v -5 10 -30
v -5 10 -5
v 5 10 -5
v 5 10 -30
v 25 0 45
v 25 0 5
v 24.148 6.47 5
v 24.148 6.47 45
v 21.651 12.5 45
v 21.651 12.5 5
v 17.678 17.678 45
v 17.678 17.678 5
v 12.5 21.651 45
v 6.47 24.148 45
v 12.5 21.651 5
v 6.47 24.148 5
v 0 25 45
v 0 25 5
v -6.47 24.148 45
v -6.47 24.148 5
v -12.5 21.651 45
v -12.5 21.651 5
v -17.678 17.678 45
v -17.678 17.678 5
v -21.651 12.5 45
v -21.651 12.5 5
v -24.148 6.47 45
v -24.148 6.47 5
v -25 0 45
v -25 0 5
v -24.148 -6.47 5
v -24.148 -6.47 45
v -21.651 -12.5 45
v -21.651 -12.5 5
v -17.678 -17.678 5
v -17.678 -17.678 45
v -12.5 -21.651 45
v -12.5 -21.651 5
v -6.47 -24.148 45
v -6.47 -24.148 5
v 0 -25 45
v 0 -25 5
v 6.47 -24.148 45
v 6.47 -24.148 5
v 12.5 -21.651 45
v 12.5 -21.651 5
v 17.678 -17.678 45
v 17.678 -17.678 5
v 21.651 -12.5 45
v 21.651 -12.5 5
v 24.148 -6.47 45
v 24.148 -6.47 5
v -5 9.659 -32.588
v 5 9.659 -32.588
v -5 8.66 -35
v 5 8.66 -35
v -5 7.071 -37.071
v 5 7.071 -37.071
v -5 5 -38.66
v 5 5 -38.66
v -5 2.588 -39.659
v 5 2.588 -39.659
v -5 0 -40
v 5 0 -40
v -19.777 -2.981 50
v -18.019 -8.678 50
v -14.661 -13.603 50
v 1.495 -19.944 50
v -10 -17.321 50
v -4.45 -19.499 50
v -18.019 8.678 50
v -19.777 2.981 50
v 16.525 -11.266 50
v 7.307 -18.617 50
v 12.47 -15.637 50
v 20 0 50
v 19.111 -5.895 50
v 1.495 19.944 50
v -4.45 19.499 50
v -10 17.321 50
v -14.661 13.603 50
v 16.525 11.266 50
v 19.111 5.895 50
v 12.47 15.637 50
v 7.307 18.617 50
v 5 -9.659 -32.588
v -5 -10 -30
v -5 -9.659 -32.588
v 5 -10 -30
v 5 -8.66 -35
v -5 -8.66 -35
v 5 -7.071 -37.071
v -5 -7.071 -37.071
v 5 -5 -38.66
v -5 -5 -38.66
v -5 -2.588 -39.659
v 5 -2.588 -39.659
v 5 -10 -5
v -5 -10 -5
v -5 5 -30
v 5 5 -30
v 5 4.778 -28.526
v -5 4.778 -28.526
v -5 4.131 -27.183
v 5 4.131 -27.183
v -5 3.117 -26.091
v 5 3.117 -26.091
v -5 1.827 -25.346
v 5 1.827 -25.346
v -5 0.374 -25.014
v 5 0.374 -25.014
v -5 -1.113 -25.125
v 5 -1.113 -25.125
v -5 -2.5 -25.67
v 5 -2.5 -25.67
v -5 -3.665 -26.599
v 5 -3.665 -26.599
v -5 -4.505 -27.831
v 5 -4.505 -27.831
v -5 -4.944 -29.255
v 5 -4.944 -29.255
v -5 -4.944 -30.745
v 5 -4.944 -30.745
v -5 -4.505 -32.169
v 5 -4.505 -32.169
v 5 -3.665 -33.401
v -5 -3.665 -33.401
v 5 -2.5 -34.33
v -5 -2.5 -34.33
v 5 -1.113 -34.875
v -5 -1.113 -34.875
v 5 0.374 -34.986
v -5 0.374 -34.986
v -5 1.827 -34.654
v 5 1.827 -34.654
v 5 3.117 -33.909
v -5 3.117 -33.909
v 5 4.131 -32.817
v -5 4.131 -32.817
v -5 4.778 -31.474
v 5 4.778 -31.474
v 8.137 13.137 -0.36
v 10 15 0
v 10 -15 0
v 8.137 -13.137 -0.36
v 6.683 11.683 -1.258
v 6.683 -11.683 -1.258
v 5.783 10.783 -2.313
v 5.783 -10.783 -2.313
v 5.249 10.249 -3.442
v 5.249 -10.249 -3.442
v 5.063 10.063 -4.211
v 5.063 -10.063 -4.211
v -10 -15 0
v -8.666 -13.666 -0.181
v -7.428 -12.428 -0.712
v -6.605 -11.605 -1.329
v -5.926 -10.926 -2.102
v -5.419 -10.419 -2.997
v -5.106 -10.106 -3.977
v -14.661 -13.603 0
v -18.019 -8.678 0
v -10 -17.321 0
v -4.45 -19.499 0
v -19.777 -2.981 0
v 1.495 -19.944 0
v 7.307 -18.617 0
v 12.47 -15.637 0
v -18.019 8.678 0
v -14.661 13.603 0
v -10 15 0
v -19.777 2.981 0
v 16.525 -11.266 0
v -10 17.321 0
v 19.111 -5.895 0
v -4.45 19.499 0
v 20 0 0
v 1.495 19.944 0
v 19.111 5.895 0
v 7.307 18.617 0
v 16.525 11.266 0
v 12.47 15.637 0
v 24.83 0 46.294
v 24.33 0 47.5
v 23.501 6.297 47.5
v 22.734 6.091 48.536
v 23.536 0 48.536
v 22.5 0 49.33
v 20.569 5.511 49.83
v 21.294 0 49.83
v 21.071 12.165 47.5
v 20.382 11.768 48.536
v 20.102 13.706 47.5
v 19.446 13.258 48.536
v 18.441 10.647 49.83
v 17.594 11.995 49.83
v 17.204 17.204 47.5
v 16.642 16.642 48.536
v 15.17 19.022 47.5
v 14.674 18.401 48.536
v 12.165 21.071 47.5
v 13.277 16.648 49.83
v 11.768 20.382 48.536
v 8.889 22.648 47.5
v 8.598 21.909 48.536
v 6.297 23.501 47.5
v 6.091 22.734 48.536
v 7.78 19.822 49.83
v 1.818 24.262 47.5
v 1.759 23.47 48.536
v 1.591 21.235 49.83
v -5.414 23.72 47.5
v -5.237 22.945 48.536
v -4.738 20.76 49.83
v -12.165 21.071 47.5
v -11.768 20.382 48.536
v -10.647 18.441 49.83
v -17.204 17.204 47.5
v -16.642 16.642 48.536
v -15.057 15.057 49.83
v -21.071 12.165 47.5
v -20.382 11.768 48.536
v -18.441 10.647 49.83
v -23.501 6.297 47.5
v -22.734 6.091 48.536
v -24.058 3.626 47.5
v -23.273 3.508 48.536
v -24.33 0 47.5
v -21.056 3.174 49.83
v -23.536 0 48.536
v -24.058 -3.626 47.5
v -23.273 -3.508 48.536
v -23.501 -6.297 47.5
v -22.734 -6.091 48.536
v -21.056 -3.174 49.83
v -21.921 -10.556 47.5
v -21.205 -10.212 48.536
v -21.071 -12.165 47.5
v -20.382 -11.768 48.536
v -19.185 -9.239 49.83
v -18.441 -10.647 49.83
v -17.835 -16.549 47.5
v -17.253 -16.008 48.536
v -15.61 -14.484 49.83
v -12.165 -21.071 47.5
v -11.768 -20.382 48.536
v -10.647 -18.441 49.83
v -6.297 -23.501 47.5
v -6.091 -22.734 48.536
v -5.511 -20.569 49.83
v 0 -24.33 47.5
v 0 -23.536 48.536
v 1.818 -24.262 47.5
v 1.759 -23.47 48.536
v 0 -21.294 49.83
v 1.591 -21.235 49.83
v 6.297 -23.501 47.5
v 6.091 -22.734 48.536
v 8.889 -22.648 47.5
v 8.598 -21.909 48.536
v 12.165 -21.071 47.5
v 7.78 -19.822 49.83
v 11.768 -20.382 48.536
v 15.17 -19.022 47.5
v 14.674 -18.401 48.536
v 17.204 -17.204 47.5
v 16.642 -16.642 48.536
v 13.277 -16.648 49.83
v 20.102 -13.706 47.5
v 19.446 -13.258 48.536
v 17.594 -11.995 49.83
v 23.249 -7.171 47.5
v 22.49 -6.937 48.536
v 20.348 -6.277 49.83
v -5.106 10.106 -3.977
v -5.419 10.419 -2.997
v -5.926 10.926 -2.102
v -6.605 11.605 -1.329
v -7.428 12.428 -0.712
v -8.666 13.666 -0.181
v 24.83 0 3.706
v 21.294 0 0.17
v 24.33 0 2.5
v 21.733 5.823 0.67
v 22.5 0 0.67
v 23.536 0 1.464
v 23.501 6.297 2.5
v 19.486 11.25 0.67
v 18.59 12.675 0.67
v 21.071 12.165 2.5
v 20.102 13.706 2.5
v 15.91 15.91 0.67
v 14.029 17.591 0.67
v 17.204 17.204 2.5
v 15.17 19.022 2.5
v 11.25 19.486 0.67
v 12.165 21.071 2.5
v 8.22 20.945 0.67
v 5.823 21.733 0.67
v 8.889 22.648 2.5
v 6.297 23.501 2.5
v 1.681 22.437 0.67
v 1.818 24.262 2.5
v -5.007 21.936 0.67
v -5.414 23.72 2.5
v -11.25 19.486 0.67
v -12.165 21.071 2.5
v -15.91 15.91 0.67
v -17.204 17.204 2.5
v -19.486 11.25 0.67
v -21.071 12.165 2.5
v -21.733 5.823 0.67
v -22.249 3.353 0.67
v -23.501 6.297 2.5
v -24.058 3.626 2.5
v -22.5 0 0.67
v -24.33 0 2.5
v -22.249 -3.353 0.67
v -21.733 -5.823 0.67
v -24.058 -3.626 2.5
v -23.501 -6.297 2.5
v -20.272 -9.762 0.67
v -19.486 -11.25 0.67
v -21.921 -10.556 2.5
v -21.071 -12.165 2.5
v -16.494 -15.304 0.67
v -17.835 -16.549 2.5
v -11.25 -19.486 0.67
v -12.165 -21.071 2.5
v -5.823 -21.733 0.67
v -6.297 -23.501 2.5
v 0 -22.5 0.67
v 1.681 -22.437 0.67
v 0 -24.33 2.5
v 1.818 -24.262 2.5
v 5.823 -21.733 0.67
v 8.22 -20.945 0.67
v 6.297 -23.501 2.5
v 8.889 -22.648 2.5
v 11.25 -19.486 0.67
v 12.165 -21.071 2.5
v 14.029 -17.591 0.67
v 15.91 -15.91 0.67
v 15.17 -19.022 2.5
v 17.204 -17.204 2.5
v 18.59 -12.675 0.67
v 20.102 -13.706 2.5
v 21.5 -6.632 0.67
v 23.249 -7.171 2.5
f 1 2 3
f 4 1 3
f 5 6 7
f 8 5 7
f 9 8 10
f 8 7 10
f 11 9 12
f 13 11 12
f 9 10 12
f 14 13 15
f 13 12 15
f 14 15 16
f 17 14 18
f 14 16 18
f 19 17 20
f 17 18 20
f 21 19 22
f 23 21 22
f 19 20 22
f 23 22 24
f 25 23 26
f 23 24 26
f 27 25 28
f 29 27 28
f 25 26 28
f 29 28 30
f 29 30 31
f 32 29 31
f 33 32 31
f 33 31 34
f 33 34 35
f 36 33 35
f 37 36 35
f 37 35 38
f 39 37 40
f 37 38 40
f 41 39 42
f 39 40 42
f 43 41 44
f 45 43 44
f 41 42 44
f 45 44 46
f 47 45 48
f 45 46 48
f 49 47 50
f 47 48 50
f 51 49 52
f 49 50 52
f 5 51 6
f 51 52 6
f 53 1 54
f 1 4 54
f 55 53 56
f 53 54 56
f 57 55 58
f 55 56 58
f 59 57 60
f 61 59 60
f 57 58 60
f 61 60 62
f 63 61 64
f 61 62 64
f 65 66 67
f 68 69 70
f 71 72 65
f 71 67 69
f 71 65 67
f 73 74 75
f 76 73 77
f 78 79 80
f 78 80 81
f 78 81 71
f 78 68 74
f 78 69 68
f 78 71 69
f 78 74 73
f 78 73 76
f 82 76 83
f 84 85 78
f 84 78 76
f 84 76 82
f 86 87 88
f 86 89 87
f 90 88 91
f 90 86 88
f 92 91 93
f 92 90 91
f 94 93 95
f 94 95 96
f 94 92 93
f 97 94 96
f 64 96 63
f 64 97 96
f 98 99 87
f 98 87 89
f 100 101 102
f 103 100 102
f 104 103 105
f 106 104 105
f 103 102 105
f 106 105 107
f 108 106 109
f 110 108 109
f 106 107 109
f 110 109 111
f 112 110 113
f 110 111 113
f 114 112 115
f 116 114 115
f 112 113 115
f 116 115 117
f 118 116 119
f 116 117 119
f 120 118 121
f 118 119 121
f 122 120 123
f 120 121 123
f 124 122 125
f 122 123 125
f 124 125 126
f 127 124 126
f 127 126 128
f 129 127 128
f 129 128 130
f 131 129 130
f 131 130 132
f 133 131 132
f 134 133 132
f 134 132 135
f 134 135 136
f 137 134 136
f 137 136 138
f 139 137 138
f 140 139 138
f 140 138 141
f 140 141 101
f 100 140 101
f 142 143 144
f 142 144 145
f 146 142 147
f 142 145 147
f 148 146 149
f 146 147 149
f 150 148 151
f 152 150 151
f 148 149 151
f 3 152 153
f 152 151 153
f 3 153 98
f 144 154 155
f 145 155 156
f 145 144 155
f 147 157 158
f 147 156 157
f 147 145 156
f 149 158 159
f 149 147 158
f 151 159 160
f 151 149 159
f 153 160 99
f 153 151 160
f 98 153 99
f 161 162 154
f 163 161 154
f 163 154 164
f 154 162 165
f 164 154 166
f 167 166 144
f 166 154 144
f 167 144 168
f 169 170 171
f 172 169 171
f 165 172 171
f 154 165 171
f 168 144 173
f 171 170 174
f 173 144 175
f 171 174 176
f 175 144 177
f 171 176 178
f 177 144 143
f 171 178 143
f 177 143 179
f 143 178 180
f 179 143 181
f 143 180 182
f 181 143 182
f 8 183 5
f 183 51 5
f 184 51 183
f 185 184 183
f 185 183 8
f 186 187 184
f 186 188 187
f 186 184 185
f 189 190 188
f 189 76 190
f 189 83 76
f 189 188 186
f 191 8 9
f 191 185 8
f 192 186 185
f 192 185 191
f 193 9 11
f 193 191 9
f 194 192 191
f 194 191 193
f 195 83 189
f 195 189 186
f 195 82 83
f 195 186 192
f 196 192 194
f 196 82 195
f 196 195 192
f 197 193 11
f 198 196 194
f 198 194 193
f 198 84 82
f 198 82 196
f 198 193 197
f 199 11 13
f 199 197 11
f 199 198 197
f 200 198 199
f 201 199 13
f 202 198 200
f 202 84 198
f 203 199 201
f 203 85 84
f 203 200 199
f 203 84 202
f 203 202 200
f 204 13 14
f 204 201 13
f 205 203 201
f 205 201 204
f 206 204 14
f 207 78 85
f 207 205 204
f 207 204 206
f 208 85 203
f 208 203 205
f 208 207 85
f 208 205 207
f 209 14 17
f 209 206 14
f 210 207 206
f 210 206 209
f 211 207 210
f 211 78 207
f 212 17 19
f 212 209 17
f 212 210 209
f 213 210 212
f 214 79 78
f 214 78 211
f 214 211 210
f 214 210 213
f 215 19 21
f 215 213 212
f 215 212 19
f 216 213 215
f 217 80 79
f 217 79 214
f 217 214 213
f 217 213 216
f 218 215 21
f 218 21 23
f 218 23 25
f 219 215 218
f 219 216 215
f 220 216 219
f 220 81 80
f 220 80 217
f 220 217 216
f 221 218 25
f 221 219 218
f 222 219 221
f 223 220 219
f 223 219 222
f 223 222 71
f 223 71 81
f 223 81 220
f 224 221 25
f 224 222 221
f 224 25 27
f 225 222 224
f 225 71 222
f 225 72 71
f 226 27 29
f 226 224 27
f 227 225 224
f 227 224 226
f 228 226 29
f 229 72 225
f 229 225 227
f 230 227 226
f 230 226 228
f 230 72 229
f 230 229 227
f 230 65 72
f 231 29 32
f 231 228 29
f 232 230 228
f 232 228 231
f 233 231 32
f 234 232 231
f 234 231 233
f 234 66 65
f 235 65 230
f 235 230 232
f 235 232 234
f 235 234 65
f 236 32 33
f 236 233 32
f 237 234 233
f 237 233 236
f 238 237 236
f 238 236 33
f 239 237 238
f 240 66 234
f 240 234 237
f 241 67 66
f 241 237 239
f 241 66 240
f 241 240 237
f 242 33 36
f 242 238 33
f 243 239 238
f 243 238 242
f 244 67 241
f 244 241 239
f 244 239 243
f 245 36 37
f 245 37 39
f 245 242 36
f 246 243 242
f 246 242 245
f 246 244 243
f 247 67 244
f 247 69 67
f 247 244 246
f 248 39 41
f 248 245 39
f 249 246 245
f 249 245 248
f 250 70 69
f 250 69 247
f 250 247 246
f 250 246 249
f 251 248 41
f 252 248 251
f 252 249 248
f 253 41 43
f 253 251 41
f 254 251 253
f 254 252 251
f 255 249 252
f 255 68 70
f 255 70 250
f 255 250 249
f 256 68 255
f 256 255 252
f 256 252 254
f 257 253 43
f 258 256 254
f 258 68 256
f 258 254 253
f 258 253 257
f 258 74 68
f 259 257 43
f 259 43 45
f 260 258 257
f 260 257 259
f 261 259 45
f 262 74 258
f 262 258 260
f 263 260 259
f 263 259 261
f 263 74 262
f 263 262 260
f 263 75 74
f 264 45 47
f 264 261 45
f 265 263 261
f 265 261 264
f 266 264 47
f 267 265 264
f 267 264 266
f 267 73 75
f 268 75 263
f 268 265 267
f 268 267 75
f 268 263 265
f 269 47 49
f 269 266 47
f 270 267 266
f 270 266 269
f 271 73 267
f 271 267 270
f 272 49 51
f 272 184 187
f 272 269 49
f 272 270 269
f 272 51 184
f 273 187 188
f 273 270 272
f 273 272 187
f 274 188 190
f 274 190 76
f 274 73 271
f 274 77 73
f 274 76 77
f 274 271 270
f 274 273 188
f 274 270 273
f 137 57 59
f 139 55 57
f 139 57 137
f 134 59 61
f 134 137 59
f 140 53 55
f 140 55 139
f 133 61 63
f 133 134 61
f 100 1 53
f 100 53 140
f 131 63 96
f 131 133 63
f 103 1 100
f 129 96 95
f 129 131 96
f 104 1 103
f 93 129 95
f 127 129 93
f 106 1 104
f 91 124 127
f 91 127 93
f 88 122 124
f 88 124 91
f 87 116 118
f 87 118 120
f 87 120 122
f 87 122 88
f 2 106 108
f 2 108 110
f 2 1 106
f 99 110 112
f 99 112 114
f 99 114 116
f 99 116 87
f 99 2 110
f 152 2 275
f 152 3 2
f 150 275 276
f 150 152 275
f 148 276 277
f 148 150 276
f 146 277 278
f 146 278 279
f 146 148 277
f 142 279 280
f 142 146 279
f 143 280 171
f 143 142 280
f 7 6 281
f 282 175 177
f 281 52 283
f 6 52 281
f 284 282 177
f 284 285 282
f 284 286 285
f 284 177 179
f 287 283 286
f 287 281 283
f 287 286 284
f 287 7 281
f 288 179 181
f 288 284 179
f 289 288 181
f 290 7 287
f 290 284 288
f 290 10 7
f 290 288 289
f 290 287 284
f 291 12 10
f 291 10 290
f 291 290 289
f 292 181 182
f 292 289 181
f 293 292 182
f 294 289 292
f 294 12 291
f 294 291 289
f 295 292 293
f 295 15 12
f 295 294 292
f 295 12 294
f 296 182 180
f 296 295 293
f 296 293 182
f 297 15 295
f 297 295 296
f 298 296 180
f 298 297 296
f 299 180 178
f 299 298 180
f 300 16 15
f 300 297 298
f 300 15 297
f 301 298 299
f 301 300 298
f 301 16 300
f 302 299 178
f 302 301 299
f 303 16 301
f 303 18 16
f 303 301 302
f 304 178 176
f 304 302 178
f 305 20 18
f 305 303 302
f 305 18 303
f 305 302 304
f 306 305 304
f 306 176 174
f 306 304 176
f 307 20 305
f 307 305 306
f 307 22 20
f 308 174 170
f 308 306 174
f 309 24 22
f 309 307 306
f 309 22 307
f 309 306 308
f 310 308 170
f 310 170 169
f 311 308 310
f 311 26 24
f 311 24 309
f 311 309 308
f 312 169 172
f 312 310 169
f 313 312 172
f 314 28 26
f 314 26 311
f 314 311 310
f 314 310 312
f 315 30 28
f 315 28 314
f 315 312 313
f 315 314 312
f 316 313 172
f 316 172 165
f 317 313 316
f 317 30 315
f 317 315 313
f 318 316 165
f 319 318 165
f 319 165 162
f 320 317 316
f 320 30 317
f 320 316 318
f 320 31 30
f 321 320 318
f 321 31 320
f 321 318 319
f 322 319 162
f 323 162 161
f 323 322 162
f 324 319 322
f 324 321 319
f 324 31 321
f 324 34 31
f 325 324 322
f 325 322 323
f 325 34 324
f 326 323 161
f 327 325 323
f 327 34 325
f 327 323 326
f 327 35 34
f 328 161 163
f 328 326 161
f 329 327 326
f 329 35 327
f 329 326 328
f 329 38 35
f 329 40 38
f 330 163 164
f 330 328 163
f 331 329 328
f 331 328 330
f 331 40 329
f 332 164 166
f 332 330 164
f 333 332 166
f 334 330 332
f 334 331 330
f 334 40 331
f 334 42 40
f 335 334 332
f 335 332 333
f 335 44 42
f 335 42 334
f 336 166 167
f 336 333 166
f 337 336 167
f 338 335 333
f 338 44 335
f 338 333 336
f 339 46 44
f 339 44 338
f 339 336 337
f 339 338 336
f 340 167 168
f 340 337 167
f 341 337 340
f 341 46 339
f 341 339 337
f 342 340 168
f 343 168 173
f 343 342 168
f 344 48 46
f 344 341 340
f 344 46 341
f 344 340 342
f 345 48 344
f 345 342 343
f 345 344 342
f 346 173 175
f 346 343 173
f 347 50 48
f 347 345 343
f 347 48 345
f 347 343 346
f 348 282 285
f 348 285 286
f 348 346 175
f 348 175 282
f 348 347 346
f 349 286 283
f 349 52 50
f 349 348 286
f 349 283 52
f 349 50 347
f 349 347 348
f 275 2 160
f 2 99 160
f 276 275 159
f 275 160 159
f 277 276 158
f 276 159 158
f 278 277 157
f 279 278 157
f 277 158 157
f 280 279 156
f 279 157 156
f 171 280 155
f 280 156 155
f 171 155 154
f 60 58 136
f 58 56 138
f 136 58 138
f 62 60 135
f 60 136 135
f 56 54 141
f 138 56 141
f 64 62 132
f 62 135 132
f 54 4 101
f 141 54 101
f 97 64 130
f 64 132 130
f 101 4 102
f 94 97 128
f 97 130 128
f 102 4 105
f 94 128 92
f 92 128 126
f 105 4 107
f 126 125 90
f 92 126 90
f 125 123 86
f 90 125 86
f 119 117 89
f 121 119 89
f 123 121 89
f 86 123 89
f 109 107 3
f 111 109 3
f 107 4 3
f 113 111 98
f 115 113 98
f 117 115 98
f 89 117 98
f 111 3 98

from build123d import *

# Parameters (mm, degrees)
F0_R     = 25
F1_DEPTH = 50
F2_W     = 10
F2_H     = 20
F3_DEPTH = 40
F6_R     = 9.99999
F7_R     = 5
F5_D     = 10


# Not quite as in the source:
# - a fillet or chamfer is up to 0.001 mm smaller than in the source, because OpenCascade refuses the exact size


with BuildPart() as f1:
    # F0 (on Top) → F1 (new body)
    with BuildSketch(Plane.XY):
        Circle(F0_R)
    extrude(amount=F1_DEPTH)

    # F2 (on face) → F3 (join)
    with BuildSketch(Plane(origin=(0, 0, 0), x_dir=(1, 0, 0), z_dir=(0, 0, -1))):
        Rectangle(F2_W, F2_H)
    extrude(amount=F3_DEPTH)

    # F6 (radius 10 in the source; OpenCascade refuses exactly that, so slightly less here)
    f6_edges = [f1.edges().sort_by_distance(p)[0] for p in [
        (0, 10, -40),
        (0, -10, -40),
    ]]
    fillet(f6_edges, radius=F6_R)

    # F7
    f7_edges = [f1.edges().sort_by_distance(p)[0] for p in [
        (-25, 0, 50),
        (-25, 0, 0),
        (-5, 0, 0),
        (0, -10, 0),
        (5, 0, 0),
        (0, 10, 0),
    ]]
    fillet(f7_edges, radius=F7_R)

    # F5 (through all)
    with Locations(Plane(origin=(-5, 0, 0), x_dir=(0, -1, 0), z_dir=(-1, 0, 0))):
        with Locations((0, -30)):
            Hole(F5_D / 2)


solid = f1.part
